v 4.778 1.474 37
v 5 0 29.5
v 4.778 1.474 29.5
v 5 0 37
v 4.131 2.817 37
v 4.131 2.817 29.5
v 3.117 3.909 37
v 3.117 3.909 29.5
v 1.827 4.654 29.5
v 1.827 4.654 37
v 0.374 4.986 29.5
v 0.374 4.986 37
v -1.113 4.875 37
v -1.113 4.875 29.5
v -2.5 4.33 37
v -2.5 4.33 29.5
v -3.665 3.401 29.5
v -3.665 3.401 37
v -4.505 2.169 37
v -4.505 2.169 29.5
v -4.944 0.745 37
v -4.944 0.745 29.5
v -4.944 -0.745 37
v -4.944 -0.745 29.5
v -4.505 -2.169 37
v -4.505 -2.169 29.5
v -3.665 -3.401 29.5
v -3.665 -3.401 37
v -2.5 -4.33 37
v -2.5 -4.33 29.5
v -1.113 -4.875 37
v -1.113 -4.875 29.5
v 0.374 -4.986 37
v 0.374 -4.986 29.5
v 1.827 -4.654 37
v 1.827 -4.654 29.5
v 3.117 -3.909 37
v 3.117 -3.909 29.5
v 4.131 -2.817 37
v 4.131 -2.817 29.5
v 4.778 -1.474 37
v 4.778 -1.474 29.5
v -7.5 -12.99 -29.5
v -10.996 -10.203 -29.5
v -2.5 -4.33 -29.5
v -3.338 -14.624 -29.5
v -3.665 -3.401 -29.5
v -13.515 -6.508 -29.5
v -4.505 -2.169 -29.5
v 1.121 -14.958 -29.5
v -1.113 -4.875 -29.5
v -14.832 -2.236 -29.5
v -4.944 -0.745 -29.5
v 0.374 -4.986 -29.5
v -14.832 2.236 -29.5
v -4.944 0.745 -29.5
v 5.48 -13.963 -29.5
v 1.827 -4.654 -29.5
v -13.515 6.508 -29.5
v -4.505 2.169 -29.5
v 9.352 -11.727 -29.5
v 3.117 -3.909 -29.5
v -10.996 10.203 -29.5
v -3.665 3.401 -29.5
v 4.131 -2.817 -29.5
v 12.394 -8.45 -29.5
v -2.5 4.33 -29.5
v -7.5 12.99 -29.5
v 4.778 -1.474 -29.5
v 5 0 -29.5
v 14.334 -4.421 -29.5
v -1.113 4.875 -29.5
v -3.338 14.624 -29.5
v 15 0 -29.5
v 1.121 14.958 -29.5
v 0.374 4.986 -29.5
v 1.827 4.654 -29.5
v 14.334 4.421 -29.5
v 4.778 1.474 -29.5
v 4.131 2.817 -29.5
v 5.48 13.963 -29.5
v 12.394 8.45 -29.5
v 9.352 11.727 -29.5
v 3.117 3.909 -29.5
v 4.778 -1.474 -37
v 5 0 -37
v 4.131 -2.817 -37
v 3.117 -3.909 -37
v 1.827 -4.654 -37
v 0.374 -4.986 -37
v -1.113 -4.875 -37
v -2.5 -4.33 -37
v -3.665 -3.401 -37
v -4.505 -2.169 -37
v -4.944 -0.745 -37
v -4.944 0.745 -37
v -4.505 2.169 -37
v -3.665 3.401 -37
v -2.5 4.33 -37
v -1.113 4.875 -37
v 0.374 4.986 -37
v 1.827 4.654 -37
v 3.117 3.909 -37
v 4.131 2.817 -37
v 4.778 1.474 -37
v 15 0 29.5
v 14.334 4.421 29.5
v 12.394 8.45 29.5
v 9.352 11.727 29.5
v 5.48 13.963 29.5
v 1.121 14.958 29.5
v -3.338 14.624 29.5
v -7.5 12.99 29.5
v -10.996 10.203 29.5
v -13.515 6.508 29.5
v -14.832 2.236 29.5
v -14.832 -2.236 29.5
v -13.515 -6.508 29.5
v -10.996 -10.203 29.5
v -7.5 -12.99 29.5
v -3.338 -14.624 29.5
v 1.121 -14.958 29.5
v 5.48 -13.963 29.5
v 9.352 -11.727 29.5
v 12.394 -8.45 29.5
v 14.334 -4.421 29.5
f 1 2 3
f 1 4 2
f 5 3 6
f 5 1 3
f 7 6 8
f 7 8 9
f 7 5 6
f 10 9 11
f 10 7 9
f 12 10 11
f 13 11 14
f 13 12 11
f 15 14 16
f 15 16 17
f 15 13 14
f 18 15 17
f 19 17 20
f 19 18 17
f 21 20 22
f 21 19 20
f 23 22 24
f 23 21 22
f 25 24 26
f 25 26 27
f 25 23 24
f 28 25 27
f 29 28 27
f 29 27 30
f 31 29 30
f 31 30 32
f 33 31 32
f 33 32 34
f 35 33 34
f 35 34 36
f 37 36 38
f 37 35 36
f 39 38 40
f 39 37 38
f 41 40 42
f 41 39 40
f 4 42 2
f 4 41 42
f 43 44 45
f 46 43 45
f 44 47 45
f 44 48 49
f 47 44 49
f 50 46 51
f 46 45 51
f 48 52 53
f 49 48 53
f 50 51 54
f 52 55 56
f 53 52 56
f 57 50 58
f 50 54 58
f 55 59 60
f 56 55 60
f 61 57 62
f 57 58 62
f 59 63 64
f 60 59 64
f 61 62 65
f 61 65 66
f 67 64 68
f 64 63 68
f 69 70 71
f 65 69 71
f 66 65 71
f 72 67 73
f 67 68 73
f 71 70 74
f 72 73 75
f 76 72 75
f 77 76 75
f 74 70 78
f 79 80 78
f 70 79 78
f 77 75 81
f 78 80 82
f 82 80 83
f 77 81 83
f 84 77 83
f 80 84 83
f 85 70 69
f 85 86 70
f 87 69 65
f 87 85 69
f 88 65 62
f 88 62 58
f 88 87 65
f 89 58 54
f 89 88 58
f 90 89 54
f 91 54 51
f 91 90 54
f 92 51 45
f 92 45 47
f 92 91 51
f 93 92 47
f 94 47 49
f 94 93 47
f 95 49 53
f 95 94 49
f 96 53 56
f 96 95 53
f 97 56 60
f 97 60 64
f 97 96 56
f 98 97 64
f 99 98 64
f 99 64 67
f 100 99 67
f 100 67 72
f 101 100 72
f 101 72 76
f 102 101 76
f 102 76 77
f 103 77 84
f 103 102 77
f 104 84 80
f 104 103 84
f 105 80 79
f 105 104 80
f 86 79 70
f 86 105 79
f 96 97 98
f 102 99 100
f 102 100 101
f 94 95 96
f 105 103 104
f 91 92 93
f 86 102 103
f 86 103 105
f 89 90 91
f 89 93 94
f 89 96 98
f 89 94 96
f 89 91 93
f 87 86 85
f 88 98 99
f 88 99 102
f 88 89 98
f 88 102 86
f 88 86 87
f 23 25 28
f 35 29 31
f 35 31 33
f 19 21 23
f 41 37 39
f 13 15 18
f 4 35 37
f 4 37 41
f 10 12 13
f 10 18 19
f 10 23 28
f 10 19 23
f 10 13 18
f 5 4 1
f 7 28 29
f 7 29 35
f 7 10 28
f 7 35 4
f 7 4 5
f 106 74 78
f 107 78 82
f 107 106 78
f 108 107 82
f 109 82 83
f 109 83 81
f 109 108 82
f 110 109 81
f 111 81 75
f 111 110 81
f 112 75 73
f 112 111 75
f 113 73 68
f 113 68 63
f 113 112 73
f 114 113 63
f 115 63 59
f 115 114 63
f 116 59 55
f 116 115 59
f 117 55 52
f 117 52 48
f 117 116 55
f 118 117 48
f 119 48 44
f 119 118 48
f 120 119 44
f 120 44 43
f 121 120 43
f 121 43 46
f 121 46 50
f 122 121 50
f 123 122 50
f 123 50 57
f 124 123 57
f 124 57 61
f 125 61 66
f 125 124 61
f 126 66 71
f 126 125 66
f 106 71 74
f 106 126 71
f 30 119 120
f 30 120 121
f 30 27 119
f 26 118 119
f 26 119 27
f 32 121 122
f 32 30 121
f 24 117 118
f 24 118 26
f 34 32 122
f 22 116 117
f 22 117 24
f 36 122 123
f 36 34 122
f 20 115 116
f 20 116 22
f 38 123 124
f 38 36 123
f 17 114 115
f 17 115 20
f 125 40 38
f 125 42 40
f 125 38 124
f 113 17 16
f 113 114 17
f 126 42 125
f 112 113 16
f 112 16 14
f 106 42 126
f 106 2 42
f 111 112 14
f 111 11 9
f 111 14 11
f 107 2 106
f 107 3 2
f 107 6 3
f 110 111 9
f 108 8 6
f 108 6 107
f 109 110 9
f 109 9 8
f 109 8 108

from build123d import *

# Parameters (mm, degrees)
SKETCH1_R           = 15
BOSS_EXTRUDE1_DEPTH = 29.5
SKETCH2_R           = 5
BOSS_EXTRUDE2_DEPTH = 7.5
SKETCH3_R           = 5
BOSS_EXTRUDE3_DEPTH = 7.5


with BuildPart() as part:
    # Sketch1 → Boss-Extrude1 (new, symmetric)
    with BuildSketch(Plane.XY):
        Circle(SKETCH1_R)
    extrude(amount=BOSS_EXTRUDE1_DEPTH, both=True)

    # Sketch2 → Boss-Extrude2 (add, symmetric)
    with BuildSketch(Plane.XY.offset(29.5)):
        Circle(SKETCH2_R)
    extrude(amount=BOSS_EXTRUDE2_DEPTH, both=True)

    # Sketch3 → Boss-Extrude3 (add, symmetric)
    with BuildSketch(Plane(origin=(0, 0, -29.5), x_dir=(-1, 0, 0), z_dir=(0, 0, -1))):
        with Locations(Location((0, 0, 0), (0, 0, 180))):
            Circle(SKETCH3_R)
    extrude(amount=BOSS_EXTRUDE3_DEPTH, both=True)


solid = part.part
